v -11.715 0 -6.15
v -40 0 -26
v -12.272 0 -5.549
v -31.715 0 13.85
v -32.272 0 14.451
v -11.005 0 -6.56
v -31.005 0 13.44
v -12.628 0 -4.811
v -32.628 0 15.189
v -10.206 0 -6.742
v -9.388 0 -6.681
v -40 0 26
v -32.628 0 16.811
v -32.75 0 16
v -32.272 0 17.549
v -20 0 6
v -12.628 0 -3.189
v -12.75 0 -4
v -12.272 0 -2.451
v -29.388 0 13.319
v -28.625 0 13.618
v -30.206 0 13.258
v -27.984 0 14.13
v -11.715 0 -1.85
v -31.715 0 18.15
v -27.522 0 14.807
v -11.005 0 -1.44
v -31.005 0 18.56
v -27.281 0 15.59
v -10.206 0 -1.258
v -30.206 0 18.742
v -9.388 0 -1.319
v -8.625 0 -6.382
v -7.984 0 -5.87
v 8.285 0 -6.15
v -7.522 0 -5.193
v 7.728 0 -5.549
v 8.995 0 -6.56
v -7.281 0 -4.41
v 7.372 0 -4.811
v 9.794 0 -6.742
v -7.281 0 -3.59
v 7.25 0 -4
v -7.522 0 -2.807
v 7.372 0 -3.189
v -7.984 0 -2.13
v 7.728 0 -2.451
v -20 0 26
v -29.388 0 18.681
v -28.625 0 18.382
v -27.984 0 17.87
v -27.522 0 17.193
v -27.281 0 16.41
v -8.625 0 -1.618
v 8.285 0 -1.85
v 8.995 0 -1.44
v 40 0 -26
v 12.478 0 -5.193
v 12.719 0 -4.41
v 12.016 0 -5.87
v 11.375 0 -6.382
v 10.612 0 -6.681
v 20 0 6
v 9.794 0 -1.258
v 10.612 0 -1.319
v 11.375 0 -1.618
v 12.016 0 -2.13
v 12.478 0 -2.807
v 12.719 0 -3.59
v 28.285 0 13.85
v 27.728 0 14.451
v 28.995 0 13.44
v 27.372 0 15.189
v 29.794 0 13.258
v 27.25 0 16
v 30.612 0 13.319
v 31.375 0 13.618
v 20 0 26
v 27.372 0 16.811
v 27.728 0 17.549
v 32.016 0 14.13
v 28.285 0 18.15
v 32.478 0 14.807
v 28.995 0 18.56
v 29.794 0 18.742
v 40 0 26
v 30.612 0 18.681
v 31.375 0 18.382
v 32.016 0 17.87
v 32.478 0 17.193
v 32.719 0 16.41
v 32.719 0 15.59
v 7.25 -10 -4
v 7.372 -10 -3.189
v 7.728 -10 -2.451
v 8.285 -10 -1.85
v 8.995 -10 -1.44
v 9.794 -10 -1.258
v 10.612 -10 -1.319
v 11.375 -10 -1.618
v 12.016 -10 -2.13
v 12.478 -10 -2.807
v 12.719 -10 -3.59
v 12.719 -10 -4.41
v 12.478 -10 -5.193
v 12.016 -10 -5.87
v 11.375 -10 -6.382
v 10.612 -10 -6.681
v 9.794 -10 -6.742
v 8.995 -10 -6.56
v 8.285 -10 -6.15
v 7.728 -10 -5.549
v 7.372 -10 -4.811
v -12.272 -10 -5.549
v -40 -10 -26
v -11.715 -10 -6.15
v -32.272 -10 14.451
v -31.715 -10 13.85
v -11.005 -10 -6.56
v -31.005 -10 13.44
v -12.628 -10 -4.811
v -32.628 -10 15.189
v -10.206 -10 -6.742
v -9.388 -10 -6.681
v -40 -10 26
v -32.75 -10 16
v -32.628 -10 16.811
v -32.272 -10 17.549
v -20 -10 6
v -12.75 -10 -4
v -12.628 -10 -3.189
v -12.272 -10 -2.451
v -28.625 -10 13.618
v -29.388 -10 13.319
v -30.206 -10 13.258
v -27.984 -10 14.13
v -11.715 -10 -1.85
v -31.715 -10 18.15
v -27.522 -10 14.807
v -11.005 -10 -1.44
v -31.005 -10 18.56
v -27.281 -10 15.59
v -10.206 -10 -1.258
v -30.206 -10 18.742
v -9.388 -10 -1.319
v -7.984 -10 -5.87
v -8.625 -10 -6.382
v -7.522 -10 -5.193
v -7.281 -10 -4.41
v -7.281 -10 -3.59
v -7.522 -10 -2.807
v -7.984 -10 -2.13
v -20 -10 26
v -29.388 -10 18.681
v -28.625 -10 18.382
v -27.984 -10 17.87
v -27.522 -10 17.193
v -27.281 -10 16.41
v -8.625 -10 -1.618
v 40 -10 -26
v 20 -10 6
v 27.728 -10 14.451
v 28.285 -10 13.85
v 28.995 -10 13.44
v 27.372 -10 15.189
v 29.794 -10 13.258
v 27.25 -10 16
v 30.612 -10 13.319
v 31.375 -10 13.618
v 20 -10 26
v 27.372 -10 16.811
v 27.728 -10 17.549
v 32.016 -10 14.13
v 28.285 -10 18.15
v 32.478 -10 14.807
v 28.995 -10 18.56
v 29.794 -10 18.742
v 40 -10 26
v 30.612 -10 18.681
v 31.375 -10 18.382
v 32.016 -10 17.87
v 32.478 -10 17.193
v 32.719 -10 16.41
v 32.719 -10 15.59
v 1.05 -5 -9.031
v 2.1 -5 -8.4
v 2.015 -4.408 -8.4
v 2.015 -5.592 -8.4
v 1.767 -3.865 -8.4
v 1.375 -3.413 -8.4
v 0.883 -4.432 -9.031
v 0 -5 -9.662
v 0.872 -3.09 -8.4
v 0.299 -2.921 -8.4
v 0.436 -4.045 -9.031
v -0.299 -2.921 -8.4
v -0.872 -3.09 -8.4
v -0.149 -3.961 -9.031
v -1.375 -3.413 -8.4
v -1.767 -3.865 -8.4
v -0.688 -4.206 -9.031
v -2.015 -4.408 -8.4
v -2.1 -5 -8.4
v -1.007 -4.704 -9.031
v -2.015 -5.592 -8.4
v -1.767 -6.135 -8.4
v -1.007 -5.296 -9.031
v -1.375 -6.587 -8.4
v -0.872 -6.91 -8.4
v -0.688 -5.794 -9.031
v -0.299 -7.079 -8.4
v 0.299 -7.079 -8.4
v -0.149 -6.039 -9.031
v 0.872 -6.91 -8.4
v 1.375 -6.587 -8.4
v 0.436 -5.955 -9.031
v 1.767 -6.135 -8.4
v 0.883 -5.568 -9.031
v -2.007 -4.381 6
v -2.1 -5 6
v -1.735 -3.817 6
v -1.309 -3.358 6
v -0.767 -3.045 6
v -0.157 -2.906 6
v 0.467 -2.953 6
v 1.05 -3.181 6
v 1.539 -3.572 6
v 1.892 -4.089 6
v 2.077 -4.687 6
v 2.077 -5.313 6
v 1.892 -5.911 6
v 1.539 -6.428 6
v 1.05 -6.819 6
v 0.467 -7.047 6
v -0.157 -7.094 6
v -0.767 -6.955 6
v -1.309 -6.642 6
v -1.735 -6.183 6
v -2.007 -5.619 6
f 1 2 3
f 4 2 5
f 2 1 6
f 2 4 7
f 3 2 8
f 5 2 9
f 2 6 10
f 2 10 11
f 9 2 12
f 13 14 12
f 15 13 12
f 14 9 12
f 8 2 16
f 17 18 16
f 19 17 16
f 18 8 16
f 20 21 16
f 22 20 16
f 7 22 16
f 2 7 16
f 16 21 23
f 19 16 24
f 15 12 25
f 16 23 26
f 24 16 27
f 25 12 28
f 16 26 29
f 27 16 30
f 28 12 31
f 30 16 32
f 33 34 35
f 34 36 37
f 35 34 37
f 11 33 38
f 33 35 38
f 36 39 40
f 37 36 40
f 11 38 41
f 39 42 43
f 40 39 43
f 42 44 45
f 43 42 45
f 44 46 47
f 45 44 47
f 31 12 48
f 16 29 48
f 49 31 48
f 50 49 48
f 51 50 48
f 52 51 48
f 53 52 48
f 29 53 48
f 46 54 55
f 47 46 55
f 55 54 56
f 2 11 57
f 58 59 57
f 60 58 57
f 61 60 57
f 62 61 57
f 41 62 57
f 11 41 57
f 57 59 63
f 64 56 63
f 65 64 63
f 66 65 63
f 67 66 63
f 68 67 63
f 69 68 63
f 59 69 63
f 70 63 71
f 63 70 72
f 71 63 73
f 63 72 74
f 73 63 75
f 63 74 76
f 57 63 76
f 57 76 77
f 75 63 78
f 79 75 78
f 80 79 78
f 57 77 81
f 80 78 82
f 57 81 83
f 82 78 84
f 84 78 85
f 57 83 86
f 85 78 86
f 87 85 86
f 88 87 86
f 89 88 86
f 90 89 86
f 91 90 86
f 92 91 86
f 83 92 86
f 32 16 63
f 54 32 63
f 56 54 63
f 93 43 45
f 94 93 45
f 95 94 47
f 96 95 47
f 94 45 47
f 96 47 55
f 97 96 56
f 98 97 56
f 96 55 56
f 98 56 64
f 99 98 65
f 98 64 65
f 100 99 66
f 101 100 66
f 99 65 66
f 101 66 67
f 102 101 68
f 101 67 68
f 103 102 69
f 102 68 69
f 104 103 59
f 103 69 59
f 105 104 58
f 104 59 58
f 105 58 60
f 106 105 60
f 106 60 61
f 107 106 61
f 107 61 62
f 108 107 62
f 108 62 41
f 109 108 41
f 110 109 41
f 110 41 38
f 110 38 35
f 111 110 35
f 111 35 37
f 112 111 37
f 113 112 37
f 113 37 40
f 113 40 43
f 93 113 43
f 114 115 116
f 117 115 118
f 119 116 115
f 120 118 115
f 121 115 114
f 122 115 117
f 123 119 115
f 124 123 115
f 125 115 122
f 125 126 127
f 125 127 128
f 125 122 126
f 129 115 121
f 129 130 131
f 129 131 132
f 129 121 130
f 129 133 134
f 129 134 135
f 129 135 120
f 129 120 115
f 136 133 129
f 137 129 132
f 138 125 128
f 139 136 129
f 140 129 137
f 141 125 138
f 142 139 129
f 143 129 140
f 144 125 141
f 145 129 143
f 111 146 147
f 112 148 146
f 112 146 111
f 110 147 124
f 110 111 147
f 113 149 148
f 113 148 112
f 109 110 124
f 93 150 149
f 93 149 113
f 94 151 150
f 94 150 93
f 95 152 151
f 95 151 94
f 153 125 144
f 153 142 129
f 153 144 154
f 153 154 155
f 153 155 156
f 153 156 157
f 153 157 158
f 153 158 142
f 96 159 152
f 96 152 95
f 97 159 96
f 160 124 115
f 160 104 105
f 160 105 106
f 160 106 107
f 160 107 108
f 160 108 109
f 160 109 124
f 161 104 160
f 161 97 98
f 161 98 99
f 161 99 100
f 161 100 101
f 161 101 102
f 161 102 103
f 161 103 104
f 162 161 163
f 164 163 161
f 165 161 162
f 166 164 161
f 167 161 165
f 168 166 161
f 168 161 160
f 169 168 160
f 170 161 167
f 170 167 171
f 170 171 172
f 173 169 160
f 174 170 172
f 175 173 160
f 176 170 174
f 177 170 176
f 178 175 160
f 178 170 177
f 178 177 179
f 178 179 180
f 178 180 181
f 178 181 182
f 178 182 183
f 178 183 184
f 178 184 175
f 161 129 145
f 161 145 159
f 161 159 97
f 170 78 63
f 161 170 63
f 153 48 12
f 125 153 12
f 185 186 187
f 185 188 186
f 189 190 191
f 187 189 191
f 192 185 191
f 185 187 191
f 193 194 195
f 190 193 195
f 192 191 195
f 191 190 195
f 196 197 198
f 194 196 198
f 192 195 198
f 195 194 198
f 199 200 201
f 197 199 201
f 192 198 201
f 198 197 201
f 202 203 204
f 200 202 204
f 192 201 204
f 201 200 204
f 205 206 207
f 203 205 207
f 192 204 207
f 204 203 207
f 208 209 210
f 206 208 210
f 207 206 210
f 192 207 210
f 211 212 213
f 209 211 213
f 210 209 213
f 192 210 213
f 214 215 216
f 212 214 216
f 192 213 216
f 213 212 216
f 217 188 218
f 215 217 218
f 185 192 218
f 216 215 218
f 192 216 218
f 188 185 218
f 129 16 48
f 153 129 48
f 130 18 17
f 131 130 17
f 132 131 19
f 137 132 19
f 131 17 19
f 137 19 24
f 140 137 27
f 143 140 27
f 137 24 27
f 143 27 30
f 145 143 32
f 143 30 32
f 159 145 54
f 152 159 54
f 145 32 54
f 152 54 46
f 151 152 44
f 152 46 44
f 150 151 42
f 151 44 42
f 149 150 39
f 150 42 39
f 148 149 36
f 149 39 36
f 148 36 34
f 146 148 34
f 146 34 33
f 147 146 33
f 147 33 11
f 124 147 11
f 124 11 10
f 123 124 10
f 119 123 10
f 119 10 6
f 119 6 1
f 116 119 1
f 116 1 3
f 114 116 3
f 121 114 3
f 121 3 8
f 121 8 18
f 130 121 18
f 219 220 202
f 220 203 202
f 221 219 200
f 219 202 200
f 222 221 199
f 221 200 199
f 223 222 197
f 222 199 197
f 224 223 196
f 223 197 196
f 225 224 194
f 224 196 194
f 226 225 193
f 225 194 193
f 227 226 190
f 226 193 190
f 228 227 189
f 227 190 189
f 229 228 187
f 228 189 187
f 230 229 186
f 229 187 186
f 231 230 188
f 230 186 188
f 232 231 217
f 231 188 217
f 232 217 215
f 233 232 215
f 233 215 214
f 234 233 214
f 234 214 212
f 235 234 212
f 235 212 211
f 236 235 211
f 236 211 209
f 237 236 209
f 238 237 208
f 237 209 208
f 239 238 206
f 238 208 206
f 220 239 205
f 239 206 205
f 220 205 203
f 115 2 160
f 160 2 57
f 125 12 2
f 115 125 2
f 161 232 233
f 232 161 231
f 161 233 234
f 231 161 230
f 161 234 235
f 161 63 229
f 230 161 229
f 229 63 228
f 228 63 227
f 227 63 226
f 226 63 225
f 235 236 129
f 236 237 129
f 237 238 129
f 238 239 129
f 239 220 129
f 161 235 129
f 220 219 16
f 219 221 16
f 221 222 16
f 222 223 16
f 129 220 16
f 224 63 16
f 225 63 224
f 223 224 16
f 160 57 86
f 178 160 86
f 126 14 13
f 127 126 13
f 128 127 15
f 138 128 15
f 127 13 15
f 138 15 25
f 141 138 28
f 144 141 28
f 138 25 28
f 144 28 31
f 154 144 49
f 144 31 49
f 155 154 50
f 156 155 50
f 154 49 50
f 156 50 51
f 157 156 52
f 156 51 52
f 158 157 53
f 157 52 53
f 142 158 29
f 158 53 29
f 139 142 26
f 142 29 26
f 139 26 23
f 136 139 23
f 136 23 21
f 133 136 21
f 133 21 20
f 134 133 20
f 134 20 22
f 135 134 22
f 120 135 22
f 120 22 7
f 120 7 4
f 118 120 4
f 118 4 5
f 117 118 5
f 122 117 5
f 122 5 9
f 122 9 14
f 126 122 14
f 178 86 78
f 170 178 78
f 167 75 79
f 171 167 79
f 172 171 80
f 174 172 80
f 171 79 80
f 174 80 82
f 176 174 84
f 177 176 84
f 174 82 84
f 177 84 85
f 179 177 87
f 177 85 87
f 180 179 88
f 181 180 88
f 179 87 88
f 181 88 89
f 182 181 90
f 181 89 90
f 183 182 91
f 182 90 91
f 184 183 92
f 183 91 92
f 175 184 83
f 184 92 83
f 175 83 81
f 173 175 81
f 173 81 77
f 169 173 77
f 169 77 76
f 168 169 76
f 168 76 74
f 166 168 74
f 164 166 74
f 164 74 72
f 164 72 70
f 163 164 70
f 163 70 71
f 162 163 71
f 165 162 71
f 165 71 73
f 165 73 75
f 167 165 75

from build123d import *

# Parameters (mm, degrees)
F1_DEPTH = 10
F3_D     = 5.5
F5_D     = 4.2
F5_DEPTH = 14.4
F5_TIP   = 1.2618073


with BuildPart() as f1:
    # F0 (on Front) → F1 (new body)
    with BuildSketch(Plane.XZ):
        Polygon((-40, 26), (-40, -26), (40, -26), (40, 26), (20, 26), (20, 6), (-20, 6), (-20, 26), align=None)
    extrude(amount=F1_DEPTH)

    # F3 (through all)
    with Locations(Plane.XZ.offset(10)):
        with Locations((-30, 16), (-10, -4), (10, -4), (30, 16)):
            Hole(F3_D / 2)

    # F5
    with Locations(Plane.XY.offset(6)):
        with Locations((0, -5.0000003539)):
            Hole(F5_D / 2, depth=F5_DEPTH)
            with Locations((0, 0, -(F5_DEPTH + F5_TIP / 2))):  # 118° drill point
                Cone(0, F5_D / 2, F5_TIP, mode=Mode.SUBTRACT)


solid = f1.part
